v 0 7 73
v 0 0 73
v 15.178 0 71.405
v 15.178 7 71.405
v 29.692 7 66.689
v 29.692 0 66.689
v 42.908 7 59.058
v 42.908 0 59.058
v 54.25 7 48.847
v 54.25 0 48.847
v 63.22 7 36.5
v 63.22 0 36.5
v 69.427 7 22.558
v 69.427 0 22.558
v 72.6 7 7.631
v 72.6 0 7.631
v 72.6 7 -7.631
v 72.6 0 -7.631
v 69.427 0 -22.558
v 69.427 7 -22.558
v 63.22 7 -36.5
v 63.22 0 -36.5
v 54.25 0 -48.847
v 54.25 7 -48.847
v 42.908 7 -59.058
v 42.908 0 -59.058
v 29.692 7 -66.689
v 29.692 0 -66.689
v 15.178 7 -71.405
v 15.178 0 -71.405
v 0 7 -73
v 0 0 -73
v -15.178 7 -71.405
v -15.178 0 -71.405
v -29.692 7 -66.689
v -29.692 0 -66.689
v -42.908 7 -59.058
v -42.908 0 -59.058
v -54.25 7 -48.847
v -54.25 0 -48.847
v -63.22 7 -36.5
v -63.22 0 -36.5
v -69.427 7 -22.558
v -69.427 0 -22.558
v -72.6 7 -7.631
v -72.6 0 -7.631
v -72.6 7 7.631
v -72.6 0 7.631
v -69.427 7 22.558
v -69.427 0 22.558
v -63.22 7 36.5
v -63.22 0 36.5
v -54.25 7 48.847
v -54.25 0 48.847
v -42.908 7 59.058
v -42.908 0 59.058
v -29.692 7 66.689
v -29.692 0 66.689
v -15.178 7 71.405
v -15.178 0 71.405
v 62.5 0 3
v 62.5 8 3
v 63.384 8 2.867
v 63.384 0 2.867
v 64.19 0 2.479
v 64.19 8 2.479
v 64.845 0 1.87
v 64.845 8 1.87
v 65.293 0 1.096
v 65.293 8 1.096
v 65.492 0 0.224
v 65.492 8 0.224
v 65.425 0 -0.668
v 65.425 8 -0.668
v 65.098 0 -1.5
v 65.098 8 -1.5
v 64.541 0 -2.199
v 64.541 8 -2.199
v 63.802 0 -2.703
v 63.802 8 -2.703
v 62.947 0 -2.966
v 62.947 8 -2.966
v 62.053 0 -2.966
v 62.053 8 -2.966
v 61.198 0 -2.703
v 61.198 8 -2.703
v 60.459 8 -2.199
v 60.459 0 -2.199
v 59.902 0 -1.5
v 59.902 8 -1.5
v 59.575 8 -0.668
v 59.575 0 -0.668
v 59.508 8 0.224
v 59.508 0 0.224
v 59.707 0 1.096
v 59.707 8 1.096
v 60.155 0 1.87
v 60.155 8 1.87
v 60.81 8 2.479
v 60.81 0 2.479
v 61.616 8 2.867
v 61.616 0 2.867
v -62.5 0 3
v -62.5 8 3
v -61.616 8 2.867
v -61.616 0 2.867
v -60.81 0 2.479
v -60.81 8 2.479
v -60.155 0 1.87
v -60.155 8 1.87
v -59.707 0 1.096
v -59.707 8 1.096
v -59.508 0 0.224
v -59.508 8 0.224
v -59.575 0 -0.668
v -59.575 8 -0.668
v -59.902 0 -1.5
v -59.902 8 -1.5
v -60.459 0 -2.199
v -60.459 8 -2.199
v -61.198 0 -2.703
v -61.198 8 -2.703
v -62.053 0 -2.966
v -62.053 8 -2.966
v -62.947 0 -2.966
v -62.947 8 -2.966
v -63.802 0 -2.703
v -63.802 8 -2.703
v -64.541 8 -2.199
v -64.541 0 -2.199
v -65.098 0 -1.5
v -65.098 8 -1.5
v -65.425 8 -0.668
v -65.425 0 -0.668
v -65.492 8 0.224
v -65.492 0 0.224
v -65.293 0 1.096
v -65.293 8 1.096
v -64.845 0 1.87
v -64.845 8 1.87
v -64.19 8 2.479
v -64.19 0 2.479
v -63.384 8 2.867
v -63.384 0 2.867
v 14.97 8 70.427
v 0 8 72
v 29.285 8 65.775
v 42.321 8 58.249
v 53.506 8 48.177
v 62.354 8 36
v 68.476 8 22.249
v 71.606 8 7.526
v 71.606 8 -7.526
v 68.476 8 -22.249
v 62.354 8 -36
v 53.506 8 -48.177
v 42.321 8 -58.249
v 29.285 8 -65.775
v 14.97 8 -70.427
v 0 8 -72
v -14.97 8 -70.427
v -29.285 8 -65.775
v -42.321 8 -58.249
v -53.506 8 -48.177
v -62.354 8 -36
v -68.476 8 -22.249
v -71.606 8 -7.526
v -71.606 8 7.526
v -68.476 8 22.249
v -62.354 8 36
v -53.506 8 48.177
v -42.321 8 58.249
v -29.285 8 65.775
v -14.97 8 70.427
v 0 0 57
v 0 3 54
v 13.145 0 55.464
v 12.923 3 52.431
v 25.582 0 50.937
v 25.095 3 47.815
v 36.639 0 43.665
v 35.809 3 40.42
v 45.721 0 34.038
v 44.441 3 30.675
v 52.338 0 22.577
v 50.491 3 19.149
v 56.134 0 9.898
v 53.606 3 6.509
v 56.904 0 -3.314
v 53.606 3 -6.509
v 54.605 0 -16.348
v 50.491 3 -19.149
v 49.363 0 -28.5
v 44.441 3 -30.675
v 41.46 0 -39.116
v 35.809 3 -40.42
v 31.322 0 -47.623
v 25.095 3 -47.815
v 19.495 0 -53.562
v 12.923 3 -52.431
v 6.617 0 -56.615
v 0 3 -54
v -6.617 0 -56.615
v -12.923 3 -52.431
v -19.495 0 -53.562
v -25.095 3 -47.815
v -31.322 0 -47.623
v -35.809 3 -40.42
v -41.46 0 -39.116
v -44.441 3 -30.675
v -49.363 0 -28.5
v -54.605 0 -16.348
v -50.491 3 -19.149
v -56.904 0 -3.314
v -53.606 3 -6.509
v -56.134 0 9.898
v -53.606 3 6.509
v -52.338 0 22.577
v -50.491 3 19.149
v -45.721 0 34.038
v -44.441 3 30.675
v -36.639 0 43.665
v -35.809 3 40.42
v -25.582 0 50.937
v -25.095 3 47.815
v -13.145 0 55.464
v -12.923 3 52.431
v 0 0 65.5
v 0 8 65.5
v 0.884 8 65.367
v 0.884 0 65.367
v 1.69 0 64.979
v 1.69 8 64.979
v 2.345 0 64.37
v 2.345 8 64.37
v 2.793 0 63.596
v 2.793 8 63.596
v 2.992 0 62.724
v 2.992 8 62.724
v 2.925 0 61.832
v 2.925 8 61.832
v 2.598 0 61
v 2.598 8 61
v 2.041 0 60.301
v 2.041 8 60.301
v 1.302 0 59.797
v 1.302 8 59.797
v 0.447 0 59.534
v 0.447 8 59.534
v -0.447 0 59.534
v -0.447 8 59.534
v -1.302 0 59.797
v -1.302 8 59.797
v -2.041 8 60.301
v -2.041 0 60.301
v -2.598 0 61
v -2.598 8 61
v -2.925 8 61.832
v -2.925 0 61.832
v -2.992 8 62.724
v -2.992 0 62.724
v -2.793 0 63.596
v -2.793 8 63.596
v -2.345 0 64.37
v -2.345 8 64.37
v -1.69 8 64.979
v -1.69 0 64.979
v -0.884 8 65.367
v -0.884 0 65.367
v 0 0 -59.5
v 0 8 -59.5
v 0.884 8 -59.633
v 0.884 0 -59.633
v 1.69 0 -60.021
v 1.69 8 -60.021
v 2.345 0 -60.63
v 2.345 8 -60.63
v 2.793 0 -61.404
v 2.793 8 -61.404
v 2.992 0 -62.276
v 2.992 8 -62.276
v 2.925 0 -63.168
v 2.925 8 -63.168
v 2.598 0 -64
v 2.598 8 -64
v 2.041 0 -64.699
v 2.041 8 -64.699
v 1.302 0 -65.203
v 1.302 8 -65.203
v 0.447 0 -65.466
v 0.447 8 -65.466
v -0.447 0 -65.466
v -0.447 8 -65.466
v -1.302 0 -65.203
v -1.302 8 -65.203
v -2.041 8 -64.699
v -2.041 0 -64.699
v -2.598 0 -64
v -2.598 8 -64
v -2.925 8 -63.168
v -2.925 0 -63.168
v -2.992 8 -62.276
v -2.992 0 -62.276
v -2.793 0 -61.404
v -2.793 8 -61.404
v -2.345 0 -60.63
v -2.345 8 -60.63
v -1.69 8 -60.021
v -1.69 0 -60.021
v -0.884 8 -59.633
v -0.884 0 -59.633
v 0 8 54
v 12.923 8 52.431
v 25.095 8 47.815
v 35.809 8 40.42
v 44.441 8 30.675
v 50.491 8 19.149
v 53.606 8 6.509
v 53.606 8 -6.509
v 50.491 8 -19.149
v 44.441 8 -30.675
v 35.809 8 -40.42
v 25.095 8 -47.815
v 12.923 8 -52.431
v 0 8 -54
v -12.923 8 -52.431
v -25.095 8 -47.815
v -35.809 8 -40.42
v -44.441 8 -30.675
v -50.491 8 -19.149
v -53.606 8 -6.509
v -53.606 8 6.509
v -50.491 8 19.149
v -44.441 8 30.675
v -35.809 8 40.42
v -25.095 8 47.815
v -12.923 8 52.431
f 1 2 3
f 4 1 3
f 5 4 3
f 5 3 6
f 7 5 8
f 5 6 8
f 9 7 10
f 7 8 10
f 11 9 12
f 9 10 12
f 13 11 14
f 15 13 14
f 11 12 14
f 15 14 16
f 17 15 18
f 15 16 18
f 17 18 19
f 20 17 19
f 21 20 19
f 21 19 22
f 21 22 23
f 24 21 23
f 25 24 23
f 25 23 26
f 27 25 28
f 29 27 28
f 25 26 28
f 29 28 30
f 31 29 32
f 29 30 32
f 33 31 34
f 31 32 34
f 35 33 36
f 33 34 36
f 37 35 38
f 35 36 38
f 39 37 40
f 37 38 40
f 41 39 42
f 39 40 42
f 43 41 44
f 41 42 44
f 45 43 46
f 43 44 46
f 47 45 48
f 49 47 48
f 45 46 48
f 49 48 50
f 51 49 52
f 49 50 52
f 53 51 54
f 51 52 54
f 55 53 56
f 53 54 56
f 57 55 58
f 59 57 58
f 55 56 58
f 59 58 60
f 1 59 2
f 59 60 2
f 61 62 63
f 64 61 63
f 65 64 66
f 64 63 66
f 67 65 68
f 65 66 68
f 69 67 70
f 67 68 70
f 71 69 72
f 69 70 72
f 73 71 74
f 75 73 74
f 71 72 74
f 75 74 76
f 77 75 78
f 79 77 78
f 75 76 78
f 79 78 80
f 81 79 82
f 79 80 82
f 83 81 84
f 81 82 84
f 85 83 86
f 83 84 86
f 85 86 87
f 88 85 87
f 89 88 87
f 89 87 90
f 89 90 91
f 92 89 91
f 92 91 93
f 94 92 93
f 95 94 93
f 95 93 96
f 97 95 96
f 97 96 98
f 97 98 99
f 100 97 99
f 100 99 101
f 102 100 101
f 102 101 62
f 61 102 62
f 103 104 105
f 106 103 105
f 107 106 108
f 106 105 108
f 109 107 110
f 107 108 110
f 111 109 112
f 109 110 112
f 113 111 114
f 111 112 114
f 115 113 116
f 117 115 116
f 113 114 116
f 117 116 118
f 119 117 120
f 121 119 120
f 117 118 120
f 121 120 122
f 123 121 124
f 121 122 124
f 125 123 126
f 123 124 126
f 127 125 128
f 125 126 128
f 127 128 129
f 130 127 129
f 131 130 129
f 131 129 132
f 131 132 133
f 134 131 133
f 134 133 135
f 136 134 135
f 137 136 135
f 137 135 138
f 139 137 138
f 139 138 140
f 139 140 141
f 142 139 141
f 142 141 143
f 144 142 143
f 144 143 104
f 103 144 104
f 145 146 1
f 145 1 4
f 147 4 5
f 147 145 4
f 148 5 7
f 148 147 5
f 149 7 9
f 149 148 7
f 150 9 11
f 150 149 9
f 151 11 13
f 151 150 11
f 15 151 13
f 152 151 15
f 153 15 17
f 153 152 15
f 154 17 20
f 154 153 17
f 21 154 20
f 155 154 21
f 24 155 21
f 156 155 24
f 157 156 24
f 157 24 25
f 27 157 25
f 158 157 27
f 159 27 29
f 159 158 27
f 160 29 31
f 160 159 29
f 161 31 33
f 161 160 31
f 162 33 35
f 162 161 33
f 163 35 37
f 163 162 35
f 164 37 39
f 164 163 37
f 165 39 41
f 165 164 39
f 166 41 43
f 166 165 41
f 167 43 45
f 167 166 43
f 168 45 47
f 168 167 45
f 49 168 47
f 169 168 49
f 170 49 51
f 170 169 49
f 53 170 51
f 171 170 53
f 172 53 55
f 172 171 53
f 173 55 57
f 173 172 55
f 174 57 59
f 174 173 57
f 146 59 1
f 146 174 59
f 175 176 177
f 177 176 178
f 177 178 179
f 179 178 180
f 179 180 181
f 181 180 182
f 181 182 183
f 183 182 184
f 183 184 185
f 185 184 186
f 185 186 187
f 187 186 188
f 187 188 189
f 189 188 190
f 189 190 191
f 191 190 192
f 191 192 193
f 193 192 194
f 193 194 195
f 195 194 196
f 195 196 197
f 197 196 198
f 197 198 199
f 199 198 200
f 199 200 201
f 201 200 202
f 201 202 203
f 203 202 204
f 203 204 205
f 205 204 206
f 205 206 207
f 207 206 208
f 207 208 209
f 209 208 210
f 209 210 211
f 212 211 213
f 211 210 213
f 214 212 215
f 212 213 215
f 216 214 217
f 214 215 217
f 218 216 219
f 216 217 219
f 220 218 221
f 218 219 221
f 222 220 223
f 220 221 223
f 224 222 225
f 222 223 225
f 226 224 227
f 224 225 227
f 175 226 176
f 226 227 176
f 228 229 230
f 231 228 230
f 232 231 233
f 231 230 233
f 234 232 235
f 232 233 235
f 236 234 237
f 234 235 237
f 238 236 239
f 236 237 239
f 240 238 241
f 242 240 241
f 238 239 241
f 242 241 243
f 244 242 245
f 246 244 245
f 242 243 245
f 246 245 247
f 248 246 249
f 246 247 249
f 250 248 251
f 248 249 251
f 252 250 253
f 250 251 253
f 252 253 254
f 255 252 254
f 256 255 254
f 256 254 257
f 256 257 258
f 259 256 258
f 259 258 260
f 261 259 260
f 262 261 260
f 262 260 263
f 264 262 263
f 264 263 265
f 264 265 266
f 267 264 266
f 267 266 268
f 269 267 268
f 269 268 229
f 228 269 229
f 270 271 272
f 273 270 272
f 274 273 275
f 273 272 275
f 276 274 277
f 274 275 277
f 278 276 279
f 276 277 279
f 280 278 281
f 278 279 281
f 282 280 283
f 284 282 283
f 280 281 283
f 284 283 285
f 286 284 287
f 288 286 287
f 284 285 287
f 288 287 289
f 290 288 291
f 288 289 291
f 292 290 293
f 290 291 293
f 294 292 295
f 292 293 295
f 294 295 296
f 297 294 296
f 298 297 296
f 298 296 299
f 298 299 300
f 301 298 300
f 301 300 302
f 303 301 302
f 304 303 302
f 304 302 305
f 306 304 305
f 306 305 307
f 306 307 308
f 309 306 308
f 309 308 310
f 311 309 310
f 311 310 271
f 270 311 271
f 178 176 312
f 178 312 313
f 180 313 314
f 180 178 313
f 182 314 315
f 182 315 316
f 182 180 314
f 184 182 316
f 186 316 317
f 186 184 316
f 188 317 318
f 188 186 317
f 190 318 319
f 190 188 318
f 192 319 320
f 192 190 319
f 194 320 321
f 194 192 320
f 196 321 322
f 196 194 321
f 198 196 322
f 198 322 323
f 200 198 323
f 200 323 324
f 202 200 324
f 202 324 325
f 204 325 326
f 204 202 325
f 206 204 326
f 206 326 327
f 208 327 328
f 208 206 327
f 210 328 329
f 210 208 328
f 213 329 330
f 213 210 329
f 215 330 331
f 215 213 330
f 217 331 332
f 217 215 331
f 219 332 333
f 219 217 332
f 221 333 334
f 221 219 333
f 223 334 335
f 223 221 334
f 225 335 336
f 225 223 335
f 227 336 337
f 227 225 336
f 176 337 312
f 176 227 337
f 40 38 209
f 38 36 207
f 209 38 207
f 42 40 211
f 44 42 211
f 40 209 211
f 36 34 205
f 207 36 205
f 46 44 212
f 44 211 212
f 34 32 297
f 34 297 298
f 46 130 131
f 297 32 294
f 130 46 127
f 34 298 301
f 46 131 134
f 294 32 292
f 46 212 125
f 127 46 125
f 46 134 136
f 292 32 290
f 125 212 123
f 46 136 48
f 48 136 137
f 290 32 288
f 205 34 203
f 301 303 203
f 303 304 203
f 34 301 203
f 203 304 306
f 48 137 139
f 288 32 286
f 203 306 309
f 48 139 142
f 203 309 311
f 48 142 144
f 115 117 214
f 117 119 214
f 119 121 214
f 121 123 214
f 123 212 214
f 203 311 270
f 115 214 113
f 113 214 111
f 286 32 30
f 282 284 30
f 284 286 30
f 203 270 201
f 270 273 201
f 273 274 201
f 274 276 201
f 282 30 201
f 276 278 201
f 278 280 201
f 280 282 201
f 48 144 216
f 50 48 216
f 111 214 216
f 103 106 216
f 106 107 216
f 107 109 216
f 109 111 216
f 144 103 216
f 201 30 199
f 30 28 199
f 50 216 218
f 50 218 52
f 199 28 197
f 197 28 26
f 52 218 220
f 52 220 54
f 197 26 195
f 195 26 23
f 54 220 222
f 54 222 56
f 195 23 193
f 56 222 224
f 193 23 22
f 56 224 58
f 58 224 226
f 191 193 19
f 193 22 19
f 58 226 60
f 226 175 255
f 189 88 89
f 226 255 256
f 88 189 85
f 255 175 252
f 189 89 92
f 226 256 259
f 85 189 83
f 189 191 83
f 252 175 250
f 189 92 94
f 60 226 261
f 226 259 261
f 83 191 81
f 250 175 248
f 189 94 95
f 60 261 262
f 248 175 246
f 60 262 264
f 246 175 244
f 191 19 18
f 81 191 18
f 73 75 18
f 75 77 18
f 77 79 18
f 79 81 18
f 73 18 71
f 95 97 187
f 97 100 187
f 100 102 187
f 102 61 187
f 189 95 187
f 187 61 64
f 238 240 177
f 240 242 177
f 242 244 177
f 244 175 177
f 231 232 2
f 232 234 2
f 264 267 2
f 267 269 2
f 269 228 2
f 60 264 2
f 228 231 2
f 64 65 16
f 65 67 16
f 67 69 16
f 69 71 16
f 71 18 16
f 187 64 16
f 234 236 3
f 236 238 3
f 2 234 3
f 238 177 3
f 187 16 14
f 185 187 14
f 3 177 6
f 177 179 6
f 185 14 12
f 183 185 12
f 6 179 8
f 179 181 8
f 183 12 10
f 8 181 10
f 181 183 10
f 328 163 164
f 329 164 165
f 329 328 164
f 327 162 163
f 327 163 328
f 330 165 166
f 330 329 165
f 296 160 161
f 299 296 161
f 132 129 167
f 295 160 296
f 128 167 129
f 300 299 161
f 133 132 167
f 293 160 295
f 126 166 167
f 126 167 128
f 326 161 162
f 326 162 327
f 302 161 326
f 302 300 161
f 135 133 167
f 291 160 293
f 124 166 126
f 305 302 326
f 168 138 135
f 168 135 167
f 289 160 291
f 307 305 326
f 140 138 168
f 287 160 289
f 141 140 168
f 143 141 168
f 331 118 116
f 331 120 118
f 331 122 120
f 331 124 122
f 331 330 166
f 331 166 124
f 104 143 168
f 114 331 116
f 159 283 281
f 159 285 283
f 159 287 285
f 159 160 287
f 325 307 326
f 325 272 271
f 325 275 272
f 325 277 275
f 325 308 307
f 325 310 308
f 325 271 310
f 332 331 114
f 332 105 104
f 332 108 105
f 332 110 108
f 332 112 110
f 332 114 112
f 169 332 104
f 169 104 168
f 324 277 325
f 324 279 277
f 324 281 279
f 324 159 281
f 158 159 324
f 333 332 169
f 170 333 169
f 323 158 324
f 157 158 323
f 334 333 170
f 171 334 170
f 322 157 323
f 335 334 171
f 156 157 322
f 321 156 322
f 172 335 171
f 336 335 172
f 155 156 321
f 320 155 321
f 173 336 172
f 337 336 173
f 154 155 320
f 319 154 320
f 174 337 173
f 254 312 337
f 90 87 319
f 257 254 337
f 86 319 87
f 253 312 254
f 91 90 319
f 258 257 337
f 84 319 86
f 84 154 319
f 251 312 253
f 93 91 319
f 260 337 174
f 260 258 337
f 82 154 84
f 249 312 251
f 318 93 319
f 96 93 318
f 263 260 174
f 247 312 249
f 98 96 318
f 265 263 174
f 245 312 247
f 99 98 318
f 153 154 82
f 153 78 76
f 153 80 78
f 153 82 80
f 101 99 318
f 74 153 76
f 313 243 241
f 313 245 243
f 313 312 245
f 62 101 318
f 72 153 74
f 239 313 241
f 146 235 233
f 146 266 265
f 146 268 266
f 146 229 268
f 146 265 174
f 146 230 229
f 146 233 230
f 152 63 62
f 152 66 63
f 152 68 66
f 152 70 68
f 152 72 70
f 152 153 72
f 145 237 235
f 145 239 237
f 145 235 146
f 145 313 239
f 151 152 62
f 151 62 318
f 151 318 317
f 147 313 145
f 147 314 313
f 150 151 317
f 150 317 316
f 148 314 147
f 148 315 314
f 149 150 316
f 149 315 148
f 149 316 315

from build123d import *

# Parameters (mm, degrees)
SKETCH_1_R          = 73
SKETCH_1_R_2        = 54
EXTRUDE_1_DEPTH     = 8
SKETCH_2_R          = 3
CUT_EXTRUDE_1_DEPTH = 10
CHAMFER_1_SIZE      = 1
CHAMFER_2_SIZE      = 3


with BuildPart() as part:
    # Эскиз1 → Бобышка-Вытянуть1 (new body)
    with BuildSketch(Plane(origin=(0, 0, 0), x_dir=(1, 0, 0), z_dir=(0, 1, 0))):
        with Locations(Location((0, 0, 0), (0, 0, 270))):
            Circle(SKETCH_1_R)
        with Locations(Location((0, 0, 0), (0, 0, 270))):
            Circle(SKETCH_1_R_2, mode=Mode.SUBTRACT)
    extrude(amount=EXTRUDE_1_DEPTH)

    # Эскиз2 → Вырез-Вытянуть1 (cut)
    with BuildSketch(Plane(origin=(0, 8, 0), x_dir=(-1, 0, 0), z_dir=(0, 1, 0))):
        with Locations(Location((62.5, 0, 0), (0, 0, 90))):
            Circle(SKETCH_2_R)
        with Locations(Location((0, -62.5, 0), (0, 0, 90))):
            Circle(SKETCH_2_R)
        with Locations(Location((0, 62.5, 0), (0, 0, 90))):
            Circle(SKETCH_2_R)
        with Locations(Location((-62.5, 0, 0), (0, 0, 90))):
            Circle(SKETCH_2_R)
    extrude(amount=-CUT_EXTRUDE_1_DEPTH, mode=Mode.SUBTRACT)

    # Фаска1
    chamfer_1_edges = [part.edges().sort_by_distance(p)[0] for p in [
        (0, 8, -73),
    ]]
    chamfer(chamfer_1_edges, length=CHAMFER_1_SIZE)

    # Фаска2
    chamfer_2_edges = [part.edges().sort_by_distance(p)[0] for p in [
        (0, 0, -54),
    ]]
    chamfer(chamfer_2_edges, length=CHAMFER_2_SIZE)


solid = part.part
